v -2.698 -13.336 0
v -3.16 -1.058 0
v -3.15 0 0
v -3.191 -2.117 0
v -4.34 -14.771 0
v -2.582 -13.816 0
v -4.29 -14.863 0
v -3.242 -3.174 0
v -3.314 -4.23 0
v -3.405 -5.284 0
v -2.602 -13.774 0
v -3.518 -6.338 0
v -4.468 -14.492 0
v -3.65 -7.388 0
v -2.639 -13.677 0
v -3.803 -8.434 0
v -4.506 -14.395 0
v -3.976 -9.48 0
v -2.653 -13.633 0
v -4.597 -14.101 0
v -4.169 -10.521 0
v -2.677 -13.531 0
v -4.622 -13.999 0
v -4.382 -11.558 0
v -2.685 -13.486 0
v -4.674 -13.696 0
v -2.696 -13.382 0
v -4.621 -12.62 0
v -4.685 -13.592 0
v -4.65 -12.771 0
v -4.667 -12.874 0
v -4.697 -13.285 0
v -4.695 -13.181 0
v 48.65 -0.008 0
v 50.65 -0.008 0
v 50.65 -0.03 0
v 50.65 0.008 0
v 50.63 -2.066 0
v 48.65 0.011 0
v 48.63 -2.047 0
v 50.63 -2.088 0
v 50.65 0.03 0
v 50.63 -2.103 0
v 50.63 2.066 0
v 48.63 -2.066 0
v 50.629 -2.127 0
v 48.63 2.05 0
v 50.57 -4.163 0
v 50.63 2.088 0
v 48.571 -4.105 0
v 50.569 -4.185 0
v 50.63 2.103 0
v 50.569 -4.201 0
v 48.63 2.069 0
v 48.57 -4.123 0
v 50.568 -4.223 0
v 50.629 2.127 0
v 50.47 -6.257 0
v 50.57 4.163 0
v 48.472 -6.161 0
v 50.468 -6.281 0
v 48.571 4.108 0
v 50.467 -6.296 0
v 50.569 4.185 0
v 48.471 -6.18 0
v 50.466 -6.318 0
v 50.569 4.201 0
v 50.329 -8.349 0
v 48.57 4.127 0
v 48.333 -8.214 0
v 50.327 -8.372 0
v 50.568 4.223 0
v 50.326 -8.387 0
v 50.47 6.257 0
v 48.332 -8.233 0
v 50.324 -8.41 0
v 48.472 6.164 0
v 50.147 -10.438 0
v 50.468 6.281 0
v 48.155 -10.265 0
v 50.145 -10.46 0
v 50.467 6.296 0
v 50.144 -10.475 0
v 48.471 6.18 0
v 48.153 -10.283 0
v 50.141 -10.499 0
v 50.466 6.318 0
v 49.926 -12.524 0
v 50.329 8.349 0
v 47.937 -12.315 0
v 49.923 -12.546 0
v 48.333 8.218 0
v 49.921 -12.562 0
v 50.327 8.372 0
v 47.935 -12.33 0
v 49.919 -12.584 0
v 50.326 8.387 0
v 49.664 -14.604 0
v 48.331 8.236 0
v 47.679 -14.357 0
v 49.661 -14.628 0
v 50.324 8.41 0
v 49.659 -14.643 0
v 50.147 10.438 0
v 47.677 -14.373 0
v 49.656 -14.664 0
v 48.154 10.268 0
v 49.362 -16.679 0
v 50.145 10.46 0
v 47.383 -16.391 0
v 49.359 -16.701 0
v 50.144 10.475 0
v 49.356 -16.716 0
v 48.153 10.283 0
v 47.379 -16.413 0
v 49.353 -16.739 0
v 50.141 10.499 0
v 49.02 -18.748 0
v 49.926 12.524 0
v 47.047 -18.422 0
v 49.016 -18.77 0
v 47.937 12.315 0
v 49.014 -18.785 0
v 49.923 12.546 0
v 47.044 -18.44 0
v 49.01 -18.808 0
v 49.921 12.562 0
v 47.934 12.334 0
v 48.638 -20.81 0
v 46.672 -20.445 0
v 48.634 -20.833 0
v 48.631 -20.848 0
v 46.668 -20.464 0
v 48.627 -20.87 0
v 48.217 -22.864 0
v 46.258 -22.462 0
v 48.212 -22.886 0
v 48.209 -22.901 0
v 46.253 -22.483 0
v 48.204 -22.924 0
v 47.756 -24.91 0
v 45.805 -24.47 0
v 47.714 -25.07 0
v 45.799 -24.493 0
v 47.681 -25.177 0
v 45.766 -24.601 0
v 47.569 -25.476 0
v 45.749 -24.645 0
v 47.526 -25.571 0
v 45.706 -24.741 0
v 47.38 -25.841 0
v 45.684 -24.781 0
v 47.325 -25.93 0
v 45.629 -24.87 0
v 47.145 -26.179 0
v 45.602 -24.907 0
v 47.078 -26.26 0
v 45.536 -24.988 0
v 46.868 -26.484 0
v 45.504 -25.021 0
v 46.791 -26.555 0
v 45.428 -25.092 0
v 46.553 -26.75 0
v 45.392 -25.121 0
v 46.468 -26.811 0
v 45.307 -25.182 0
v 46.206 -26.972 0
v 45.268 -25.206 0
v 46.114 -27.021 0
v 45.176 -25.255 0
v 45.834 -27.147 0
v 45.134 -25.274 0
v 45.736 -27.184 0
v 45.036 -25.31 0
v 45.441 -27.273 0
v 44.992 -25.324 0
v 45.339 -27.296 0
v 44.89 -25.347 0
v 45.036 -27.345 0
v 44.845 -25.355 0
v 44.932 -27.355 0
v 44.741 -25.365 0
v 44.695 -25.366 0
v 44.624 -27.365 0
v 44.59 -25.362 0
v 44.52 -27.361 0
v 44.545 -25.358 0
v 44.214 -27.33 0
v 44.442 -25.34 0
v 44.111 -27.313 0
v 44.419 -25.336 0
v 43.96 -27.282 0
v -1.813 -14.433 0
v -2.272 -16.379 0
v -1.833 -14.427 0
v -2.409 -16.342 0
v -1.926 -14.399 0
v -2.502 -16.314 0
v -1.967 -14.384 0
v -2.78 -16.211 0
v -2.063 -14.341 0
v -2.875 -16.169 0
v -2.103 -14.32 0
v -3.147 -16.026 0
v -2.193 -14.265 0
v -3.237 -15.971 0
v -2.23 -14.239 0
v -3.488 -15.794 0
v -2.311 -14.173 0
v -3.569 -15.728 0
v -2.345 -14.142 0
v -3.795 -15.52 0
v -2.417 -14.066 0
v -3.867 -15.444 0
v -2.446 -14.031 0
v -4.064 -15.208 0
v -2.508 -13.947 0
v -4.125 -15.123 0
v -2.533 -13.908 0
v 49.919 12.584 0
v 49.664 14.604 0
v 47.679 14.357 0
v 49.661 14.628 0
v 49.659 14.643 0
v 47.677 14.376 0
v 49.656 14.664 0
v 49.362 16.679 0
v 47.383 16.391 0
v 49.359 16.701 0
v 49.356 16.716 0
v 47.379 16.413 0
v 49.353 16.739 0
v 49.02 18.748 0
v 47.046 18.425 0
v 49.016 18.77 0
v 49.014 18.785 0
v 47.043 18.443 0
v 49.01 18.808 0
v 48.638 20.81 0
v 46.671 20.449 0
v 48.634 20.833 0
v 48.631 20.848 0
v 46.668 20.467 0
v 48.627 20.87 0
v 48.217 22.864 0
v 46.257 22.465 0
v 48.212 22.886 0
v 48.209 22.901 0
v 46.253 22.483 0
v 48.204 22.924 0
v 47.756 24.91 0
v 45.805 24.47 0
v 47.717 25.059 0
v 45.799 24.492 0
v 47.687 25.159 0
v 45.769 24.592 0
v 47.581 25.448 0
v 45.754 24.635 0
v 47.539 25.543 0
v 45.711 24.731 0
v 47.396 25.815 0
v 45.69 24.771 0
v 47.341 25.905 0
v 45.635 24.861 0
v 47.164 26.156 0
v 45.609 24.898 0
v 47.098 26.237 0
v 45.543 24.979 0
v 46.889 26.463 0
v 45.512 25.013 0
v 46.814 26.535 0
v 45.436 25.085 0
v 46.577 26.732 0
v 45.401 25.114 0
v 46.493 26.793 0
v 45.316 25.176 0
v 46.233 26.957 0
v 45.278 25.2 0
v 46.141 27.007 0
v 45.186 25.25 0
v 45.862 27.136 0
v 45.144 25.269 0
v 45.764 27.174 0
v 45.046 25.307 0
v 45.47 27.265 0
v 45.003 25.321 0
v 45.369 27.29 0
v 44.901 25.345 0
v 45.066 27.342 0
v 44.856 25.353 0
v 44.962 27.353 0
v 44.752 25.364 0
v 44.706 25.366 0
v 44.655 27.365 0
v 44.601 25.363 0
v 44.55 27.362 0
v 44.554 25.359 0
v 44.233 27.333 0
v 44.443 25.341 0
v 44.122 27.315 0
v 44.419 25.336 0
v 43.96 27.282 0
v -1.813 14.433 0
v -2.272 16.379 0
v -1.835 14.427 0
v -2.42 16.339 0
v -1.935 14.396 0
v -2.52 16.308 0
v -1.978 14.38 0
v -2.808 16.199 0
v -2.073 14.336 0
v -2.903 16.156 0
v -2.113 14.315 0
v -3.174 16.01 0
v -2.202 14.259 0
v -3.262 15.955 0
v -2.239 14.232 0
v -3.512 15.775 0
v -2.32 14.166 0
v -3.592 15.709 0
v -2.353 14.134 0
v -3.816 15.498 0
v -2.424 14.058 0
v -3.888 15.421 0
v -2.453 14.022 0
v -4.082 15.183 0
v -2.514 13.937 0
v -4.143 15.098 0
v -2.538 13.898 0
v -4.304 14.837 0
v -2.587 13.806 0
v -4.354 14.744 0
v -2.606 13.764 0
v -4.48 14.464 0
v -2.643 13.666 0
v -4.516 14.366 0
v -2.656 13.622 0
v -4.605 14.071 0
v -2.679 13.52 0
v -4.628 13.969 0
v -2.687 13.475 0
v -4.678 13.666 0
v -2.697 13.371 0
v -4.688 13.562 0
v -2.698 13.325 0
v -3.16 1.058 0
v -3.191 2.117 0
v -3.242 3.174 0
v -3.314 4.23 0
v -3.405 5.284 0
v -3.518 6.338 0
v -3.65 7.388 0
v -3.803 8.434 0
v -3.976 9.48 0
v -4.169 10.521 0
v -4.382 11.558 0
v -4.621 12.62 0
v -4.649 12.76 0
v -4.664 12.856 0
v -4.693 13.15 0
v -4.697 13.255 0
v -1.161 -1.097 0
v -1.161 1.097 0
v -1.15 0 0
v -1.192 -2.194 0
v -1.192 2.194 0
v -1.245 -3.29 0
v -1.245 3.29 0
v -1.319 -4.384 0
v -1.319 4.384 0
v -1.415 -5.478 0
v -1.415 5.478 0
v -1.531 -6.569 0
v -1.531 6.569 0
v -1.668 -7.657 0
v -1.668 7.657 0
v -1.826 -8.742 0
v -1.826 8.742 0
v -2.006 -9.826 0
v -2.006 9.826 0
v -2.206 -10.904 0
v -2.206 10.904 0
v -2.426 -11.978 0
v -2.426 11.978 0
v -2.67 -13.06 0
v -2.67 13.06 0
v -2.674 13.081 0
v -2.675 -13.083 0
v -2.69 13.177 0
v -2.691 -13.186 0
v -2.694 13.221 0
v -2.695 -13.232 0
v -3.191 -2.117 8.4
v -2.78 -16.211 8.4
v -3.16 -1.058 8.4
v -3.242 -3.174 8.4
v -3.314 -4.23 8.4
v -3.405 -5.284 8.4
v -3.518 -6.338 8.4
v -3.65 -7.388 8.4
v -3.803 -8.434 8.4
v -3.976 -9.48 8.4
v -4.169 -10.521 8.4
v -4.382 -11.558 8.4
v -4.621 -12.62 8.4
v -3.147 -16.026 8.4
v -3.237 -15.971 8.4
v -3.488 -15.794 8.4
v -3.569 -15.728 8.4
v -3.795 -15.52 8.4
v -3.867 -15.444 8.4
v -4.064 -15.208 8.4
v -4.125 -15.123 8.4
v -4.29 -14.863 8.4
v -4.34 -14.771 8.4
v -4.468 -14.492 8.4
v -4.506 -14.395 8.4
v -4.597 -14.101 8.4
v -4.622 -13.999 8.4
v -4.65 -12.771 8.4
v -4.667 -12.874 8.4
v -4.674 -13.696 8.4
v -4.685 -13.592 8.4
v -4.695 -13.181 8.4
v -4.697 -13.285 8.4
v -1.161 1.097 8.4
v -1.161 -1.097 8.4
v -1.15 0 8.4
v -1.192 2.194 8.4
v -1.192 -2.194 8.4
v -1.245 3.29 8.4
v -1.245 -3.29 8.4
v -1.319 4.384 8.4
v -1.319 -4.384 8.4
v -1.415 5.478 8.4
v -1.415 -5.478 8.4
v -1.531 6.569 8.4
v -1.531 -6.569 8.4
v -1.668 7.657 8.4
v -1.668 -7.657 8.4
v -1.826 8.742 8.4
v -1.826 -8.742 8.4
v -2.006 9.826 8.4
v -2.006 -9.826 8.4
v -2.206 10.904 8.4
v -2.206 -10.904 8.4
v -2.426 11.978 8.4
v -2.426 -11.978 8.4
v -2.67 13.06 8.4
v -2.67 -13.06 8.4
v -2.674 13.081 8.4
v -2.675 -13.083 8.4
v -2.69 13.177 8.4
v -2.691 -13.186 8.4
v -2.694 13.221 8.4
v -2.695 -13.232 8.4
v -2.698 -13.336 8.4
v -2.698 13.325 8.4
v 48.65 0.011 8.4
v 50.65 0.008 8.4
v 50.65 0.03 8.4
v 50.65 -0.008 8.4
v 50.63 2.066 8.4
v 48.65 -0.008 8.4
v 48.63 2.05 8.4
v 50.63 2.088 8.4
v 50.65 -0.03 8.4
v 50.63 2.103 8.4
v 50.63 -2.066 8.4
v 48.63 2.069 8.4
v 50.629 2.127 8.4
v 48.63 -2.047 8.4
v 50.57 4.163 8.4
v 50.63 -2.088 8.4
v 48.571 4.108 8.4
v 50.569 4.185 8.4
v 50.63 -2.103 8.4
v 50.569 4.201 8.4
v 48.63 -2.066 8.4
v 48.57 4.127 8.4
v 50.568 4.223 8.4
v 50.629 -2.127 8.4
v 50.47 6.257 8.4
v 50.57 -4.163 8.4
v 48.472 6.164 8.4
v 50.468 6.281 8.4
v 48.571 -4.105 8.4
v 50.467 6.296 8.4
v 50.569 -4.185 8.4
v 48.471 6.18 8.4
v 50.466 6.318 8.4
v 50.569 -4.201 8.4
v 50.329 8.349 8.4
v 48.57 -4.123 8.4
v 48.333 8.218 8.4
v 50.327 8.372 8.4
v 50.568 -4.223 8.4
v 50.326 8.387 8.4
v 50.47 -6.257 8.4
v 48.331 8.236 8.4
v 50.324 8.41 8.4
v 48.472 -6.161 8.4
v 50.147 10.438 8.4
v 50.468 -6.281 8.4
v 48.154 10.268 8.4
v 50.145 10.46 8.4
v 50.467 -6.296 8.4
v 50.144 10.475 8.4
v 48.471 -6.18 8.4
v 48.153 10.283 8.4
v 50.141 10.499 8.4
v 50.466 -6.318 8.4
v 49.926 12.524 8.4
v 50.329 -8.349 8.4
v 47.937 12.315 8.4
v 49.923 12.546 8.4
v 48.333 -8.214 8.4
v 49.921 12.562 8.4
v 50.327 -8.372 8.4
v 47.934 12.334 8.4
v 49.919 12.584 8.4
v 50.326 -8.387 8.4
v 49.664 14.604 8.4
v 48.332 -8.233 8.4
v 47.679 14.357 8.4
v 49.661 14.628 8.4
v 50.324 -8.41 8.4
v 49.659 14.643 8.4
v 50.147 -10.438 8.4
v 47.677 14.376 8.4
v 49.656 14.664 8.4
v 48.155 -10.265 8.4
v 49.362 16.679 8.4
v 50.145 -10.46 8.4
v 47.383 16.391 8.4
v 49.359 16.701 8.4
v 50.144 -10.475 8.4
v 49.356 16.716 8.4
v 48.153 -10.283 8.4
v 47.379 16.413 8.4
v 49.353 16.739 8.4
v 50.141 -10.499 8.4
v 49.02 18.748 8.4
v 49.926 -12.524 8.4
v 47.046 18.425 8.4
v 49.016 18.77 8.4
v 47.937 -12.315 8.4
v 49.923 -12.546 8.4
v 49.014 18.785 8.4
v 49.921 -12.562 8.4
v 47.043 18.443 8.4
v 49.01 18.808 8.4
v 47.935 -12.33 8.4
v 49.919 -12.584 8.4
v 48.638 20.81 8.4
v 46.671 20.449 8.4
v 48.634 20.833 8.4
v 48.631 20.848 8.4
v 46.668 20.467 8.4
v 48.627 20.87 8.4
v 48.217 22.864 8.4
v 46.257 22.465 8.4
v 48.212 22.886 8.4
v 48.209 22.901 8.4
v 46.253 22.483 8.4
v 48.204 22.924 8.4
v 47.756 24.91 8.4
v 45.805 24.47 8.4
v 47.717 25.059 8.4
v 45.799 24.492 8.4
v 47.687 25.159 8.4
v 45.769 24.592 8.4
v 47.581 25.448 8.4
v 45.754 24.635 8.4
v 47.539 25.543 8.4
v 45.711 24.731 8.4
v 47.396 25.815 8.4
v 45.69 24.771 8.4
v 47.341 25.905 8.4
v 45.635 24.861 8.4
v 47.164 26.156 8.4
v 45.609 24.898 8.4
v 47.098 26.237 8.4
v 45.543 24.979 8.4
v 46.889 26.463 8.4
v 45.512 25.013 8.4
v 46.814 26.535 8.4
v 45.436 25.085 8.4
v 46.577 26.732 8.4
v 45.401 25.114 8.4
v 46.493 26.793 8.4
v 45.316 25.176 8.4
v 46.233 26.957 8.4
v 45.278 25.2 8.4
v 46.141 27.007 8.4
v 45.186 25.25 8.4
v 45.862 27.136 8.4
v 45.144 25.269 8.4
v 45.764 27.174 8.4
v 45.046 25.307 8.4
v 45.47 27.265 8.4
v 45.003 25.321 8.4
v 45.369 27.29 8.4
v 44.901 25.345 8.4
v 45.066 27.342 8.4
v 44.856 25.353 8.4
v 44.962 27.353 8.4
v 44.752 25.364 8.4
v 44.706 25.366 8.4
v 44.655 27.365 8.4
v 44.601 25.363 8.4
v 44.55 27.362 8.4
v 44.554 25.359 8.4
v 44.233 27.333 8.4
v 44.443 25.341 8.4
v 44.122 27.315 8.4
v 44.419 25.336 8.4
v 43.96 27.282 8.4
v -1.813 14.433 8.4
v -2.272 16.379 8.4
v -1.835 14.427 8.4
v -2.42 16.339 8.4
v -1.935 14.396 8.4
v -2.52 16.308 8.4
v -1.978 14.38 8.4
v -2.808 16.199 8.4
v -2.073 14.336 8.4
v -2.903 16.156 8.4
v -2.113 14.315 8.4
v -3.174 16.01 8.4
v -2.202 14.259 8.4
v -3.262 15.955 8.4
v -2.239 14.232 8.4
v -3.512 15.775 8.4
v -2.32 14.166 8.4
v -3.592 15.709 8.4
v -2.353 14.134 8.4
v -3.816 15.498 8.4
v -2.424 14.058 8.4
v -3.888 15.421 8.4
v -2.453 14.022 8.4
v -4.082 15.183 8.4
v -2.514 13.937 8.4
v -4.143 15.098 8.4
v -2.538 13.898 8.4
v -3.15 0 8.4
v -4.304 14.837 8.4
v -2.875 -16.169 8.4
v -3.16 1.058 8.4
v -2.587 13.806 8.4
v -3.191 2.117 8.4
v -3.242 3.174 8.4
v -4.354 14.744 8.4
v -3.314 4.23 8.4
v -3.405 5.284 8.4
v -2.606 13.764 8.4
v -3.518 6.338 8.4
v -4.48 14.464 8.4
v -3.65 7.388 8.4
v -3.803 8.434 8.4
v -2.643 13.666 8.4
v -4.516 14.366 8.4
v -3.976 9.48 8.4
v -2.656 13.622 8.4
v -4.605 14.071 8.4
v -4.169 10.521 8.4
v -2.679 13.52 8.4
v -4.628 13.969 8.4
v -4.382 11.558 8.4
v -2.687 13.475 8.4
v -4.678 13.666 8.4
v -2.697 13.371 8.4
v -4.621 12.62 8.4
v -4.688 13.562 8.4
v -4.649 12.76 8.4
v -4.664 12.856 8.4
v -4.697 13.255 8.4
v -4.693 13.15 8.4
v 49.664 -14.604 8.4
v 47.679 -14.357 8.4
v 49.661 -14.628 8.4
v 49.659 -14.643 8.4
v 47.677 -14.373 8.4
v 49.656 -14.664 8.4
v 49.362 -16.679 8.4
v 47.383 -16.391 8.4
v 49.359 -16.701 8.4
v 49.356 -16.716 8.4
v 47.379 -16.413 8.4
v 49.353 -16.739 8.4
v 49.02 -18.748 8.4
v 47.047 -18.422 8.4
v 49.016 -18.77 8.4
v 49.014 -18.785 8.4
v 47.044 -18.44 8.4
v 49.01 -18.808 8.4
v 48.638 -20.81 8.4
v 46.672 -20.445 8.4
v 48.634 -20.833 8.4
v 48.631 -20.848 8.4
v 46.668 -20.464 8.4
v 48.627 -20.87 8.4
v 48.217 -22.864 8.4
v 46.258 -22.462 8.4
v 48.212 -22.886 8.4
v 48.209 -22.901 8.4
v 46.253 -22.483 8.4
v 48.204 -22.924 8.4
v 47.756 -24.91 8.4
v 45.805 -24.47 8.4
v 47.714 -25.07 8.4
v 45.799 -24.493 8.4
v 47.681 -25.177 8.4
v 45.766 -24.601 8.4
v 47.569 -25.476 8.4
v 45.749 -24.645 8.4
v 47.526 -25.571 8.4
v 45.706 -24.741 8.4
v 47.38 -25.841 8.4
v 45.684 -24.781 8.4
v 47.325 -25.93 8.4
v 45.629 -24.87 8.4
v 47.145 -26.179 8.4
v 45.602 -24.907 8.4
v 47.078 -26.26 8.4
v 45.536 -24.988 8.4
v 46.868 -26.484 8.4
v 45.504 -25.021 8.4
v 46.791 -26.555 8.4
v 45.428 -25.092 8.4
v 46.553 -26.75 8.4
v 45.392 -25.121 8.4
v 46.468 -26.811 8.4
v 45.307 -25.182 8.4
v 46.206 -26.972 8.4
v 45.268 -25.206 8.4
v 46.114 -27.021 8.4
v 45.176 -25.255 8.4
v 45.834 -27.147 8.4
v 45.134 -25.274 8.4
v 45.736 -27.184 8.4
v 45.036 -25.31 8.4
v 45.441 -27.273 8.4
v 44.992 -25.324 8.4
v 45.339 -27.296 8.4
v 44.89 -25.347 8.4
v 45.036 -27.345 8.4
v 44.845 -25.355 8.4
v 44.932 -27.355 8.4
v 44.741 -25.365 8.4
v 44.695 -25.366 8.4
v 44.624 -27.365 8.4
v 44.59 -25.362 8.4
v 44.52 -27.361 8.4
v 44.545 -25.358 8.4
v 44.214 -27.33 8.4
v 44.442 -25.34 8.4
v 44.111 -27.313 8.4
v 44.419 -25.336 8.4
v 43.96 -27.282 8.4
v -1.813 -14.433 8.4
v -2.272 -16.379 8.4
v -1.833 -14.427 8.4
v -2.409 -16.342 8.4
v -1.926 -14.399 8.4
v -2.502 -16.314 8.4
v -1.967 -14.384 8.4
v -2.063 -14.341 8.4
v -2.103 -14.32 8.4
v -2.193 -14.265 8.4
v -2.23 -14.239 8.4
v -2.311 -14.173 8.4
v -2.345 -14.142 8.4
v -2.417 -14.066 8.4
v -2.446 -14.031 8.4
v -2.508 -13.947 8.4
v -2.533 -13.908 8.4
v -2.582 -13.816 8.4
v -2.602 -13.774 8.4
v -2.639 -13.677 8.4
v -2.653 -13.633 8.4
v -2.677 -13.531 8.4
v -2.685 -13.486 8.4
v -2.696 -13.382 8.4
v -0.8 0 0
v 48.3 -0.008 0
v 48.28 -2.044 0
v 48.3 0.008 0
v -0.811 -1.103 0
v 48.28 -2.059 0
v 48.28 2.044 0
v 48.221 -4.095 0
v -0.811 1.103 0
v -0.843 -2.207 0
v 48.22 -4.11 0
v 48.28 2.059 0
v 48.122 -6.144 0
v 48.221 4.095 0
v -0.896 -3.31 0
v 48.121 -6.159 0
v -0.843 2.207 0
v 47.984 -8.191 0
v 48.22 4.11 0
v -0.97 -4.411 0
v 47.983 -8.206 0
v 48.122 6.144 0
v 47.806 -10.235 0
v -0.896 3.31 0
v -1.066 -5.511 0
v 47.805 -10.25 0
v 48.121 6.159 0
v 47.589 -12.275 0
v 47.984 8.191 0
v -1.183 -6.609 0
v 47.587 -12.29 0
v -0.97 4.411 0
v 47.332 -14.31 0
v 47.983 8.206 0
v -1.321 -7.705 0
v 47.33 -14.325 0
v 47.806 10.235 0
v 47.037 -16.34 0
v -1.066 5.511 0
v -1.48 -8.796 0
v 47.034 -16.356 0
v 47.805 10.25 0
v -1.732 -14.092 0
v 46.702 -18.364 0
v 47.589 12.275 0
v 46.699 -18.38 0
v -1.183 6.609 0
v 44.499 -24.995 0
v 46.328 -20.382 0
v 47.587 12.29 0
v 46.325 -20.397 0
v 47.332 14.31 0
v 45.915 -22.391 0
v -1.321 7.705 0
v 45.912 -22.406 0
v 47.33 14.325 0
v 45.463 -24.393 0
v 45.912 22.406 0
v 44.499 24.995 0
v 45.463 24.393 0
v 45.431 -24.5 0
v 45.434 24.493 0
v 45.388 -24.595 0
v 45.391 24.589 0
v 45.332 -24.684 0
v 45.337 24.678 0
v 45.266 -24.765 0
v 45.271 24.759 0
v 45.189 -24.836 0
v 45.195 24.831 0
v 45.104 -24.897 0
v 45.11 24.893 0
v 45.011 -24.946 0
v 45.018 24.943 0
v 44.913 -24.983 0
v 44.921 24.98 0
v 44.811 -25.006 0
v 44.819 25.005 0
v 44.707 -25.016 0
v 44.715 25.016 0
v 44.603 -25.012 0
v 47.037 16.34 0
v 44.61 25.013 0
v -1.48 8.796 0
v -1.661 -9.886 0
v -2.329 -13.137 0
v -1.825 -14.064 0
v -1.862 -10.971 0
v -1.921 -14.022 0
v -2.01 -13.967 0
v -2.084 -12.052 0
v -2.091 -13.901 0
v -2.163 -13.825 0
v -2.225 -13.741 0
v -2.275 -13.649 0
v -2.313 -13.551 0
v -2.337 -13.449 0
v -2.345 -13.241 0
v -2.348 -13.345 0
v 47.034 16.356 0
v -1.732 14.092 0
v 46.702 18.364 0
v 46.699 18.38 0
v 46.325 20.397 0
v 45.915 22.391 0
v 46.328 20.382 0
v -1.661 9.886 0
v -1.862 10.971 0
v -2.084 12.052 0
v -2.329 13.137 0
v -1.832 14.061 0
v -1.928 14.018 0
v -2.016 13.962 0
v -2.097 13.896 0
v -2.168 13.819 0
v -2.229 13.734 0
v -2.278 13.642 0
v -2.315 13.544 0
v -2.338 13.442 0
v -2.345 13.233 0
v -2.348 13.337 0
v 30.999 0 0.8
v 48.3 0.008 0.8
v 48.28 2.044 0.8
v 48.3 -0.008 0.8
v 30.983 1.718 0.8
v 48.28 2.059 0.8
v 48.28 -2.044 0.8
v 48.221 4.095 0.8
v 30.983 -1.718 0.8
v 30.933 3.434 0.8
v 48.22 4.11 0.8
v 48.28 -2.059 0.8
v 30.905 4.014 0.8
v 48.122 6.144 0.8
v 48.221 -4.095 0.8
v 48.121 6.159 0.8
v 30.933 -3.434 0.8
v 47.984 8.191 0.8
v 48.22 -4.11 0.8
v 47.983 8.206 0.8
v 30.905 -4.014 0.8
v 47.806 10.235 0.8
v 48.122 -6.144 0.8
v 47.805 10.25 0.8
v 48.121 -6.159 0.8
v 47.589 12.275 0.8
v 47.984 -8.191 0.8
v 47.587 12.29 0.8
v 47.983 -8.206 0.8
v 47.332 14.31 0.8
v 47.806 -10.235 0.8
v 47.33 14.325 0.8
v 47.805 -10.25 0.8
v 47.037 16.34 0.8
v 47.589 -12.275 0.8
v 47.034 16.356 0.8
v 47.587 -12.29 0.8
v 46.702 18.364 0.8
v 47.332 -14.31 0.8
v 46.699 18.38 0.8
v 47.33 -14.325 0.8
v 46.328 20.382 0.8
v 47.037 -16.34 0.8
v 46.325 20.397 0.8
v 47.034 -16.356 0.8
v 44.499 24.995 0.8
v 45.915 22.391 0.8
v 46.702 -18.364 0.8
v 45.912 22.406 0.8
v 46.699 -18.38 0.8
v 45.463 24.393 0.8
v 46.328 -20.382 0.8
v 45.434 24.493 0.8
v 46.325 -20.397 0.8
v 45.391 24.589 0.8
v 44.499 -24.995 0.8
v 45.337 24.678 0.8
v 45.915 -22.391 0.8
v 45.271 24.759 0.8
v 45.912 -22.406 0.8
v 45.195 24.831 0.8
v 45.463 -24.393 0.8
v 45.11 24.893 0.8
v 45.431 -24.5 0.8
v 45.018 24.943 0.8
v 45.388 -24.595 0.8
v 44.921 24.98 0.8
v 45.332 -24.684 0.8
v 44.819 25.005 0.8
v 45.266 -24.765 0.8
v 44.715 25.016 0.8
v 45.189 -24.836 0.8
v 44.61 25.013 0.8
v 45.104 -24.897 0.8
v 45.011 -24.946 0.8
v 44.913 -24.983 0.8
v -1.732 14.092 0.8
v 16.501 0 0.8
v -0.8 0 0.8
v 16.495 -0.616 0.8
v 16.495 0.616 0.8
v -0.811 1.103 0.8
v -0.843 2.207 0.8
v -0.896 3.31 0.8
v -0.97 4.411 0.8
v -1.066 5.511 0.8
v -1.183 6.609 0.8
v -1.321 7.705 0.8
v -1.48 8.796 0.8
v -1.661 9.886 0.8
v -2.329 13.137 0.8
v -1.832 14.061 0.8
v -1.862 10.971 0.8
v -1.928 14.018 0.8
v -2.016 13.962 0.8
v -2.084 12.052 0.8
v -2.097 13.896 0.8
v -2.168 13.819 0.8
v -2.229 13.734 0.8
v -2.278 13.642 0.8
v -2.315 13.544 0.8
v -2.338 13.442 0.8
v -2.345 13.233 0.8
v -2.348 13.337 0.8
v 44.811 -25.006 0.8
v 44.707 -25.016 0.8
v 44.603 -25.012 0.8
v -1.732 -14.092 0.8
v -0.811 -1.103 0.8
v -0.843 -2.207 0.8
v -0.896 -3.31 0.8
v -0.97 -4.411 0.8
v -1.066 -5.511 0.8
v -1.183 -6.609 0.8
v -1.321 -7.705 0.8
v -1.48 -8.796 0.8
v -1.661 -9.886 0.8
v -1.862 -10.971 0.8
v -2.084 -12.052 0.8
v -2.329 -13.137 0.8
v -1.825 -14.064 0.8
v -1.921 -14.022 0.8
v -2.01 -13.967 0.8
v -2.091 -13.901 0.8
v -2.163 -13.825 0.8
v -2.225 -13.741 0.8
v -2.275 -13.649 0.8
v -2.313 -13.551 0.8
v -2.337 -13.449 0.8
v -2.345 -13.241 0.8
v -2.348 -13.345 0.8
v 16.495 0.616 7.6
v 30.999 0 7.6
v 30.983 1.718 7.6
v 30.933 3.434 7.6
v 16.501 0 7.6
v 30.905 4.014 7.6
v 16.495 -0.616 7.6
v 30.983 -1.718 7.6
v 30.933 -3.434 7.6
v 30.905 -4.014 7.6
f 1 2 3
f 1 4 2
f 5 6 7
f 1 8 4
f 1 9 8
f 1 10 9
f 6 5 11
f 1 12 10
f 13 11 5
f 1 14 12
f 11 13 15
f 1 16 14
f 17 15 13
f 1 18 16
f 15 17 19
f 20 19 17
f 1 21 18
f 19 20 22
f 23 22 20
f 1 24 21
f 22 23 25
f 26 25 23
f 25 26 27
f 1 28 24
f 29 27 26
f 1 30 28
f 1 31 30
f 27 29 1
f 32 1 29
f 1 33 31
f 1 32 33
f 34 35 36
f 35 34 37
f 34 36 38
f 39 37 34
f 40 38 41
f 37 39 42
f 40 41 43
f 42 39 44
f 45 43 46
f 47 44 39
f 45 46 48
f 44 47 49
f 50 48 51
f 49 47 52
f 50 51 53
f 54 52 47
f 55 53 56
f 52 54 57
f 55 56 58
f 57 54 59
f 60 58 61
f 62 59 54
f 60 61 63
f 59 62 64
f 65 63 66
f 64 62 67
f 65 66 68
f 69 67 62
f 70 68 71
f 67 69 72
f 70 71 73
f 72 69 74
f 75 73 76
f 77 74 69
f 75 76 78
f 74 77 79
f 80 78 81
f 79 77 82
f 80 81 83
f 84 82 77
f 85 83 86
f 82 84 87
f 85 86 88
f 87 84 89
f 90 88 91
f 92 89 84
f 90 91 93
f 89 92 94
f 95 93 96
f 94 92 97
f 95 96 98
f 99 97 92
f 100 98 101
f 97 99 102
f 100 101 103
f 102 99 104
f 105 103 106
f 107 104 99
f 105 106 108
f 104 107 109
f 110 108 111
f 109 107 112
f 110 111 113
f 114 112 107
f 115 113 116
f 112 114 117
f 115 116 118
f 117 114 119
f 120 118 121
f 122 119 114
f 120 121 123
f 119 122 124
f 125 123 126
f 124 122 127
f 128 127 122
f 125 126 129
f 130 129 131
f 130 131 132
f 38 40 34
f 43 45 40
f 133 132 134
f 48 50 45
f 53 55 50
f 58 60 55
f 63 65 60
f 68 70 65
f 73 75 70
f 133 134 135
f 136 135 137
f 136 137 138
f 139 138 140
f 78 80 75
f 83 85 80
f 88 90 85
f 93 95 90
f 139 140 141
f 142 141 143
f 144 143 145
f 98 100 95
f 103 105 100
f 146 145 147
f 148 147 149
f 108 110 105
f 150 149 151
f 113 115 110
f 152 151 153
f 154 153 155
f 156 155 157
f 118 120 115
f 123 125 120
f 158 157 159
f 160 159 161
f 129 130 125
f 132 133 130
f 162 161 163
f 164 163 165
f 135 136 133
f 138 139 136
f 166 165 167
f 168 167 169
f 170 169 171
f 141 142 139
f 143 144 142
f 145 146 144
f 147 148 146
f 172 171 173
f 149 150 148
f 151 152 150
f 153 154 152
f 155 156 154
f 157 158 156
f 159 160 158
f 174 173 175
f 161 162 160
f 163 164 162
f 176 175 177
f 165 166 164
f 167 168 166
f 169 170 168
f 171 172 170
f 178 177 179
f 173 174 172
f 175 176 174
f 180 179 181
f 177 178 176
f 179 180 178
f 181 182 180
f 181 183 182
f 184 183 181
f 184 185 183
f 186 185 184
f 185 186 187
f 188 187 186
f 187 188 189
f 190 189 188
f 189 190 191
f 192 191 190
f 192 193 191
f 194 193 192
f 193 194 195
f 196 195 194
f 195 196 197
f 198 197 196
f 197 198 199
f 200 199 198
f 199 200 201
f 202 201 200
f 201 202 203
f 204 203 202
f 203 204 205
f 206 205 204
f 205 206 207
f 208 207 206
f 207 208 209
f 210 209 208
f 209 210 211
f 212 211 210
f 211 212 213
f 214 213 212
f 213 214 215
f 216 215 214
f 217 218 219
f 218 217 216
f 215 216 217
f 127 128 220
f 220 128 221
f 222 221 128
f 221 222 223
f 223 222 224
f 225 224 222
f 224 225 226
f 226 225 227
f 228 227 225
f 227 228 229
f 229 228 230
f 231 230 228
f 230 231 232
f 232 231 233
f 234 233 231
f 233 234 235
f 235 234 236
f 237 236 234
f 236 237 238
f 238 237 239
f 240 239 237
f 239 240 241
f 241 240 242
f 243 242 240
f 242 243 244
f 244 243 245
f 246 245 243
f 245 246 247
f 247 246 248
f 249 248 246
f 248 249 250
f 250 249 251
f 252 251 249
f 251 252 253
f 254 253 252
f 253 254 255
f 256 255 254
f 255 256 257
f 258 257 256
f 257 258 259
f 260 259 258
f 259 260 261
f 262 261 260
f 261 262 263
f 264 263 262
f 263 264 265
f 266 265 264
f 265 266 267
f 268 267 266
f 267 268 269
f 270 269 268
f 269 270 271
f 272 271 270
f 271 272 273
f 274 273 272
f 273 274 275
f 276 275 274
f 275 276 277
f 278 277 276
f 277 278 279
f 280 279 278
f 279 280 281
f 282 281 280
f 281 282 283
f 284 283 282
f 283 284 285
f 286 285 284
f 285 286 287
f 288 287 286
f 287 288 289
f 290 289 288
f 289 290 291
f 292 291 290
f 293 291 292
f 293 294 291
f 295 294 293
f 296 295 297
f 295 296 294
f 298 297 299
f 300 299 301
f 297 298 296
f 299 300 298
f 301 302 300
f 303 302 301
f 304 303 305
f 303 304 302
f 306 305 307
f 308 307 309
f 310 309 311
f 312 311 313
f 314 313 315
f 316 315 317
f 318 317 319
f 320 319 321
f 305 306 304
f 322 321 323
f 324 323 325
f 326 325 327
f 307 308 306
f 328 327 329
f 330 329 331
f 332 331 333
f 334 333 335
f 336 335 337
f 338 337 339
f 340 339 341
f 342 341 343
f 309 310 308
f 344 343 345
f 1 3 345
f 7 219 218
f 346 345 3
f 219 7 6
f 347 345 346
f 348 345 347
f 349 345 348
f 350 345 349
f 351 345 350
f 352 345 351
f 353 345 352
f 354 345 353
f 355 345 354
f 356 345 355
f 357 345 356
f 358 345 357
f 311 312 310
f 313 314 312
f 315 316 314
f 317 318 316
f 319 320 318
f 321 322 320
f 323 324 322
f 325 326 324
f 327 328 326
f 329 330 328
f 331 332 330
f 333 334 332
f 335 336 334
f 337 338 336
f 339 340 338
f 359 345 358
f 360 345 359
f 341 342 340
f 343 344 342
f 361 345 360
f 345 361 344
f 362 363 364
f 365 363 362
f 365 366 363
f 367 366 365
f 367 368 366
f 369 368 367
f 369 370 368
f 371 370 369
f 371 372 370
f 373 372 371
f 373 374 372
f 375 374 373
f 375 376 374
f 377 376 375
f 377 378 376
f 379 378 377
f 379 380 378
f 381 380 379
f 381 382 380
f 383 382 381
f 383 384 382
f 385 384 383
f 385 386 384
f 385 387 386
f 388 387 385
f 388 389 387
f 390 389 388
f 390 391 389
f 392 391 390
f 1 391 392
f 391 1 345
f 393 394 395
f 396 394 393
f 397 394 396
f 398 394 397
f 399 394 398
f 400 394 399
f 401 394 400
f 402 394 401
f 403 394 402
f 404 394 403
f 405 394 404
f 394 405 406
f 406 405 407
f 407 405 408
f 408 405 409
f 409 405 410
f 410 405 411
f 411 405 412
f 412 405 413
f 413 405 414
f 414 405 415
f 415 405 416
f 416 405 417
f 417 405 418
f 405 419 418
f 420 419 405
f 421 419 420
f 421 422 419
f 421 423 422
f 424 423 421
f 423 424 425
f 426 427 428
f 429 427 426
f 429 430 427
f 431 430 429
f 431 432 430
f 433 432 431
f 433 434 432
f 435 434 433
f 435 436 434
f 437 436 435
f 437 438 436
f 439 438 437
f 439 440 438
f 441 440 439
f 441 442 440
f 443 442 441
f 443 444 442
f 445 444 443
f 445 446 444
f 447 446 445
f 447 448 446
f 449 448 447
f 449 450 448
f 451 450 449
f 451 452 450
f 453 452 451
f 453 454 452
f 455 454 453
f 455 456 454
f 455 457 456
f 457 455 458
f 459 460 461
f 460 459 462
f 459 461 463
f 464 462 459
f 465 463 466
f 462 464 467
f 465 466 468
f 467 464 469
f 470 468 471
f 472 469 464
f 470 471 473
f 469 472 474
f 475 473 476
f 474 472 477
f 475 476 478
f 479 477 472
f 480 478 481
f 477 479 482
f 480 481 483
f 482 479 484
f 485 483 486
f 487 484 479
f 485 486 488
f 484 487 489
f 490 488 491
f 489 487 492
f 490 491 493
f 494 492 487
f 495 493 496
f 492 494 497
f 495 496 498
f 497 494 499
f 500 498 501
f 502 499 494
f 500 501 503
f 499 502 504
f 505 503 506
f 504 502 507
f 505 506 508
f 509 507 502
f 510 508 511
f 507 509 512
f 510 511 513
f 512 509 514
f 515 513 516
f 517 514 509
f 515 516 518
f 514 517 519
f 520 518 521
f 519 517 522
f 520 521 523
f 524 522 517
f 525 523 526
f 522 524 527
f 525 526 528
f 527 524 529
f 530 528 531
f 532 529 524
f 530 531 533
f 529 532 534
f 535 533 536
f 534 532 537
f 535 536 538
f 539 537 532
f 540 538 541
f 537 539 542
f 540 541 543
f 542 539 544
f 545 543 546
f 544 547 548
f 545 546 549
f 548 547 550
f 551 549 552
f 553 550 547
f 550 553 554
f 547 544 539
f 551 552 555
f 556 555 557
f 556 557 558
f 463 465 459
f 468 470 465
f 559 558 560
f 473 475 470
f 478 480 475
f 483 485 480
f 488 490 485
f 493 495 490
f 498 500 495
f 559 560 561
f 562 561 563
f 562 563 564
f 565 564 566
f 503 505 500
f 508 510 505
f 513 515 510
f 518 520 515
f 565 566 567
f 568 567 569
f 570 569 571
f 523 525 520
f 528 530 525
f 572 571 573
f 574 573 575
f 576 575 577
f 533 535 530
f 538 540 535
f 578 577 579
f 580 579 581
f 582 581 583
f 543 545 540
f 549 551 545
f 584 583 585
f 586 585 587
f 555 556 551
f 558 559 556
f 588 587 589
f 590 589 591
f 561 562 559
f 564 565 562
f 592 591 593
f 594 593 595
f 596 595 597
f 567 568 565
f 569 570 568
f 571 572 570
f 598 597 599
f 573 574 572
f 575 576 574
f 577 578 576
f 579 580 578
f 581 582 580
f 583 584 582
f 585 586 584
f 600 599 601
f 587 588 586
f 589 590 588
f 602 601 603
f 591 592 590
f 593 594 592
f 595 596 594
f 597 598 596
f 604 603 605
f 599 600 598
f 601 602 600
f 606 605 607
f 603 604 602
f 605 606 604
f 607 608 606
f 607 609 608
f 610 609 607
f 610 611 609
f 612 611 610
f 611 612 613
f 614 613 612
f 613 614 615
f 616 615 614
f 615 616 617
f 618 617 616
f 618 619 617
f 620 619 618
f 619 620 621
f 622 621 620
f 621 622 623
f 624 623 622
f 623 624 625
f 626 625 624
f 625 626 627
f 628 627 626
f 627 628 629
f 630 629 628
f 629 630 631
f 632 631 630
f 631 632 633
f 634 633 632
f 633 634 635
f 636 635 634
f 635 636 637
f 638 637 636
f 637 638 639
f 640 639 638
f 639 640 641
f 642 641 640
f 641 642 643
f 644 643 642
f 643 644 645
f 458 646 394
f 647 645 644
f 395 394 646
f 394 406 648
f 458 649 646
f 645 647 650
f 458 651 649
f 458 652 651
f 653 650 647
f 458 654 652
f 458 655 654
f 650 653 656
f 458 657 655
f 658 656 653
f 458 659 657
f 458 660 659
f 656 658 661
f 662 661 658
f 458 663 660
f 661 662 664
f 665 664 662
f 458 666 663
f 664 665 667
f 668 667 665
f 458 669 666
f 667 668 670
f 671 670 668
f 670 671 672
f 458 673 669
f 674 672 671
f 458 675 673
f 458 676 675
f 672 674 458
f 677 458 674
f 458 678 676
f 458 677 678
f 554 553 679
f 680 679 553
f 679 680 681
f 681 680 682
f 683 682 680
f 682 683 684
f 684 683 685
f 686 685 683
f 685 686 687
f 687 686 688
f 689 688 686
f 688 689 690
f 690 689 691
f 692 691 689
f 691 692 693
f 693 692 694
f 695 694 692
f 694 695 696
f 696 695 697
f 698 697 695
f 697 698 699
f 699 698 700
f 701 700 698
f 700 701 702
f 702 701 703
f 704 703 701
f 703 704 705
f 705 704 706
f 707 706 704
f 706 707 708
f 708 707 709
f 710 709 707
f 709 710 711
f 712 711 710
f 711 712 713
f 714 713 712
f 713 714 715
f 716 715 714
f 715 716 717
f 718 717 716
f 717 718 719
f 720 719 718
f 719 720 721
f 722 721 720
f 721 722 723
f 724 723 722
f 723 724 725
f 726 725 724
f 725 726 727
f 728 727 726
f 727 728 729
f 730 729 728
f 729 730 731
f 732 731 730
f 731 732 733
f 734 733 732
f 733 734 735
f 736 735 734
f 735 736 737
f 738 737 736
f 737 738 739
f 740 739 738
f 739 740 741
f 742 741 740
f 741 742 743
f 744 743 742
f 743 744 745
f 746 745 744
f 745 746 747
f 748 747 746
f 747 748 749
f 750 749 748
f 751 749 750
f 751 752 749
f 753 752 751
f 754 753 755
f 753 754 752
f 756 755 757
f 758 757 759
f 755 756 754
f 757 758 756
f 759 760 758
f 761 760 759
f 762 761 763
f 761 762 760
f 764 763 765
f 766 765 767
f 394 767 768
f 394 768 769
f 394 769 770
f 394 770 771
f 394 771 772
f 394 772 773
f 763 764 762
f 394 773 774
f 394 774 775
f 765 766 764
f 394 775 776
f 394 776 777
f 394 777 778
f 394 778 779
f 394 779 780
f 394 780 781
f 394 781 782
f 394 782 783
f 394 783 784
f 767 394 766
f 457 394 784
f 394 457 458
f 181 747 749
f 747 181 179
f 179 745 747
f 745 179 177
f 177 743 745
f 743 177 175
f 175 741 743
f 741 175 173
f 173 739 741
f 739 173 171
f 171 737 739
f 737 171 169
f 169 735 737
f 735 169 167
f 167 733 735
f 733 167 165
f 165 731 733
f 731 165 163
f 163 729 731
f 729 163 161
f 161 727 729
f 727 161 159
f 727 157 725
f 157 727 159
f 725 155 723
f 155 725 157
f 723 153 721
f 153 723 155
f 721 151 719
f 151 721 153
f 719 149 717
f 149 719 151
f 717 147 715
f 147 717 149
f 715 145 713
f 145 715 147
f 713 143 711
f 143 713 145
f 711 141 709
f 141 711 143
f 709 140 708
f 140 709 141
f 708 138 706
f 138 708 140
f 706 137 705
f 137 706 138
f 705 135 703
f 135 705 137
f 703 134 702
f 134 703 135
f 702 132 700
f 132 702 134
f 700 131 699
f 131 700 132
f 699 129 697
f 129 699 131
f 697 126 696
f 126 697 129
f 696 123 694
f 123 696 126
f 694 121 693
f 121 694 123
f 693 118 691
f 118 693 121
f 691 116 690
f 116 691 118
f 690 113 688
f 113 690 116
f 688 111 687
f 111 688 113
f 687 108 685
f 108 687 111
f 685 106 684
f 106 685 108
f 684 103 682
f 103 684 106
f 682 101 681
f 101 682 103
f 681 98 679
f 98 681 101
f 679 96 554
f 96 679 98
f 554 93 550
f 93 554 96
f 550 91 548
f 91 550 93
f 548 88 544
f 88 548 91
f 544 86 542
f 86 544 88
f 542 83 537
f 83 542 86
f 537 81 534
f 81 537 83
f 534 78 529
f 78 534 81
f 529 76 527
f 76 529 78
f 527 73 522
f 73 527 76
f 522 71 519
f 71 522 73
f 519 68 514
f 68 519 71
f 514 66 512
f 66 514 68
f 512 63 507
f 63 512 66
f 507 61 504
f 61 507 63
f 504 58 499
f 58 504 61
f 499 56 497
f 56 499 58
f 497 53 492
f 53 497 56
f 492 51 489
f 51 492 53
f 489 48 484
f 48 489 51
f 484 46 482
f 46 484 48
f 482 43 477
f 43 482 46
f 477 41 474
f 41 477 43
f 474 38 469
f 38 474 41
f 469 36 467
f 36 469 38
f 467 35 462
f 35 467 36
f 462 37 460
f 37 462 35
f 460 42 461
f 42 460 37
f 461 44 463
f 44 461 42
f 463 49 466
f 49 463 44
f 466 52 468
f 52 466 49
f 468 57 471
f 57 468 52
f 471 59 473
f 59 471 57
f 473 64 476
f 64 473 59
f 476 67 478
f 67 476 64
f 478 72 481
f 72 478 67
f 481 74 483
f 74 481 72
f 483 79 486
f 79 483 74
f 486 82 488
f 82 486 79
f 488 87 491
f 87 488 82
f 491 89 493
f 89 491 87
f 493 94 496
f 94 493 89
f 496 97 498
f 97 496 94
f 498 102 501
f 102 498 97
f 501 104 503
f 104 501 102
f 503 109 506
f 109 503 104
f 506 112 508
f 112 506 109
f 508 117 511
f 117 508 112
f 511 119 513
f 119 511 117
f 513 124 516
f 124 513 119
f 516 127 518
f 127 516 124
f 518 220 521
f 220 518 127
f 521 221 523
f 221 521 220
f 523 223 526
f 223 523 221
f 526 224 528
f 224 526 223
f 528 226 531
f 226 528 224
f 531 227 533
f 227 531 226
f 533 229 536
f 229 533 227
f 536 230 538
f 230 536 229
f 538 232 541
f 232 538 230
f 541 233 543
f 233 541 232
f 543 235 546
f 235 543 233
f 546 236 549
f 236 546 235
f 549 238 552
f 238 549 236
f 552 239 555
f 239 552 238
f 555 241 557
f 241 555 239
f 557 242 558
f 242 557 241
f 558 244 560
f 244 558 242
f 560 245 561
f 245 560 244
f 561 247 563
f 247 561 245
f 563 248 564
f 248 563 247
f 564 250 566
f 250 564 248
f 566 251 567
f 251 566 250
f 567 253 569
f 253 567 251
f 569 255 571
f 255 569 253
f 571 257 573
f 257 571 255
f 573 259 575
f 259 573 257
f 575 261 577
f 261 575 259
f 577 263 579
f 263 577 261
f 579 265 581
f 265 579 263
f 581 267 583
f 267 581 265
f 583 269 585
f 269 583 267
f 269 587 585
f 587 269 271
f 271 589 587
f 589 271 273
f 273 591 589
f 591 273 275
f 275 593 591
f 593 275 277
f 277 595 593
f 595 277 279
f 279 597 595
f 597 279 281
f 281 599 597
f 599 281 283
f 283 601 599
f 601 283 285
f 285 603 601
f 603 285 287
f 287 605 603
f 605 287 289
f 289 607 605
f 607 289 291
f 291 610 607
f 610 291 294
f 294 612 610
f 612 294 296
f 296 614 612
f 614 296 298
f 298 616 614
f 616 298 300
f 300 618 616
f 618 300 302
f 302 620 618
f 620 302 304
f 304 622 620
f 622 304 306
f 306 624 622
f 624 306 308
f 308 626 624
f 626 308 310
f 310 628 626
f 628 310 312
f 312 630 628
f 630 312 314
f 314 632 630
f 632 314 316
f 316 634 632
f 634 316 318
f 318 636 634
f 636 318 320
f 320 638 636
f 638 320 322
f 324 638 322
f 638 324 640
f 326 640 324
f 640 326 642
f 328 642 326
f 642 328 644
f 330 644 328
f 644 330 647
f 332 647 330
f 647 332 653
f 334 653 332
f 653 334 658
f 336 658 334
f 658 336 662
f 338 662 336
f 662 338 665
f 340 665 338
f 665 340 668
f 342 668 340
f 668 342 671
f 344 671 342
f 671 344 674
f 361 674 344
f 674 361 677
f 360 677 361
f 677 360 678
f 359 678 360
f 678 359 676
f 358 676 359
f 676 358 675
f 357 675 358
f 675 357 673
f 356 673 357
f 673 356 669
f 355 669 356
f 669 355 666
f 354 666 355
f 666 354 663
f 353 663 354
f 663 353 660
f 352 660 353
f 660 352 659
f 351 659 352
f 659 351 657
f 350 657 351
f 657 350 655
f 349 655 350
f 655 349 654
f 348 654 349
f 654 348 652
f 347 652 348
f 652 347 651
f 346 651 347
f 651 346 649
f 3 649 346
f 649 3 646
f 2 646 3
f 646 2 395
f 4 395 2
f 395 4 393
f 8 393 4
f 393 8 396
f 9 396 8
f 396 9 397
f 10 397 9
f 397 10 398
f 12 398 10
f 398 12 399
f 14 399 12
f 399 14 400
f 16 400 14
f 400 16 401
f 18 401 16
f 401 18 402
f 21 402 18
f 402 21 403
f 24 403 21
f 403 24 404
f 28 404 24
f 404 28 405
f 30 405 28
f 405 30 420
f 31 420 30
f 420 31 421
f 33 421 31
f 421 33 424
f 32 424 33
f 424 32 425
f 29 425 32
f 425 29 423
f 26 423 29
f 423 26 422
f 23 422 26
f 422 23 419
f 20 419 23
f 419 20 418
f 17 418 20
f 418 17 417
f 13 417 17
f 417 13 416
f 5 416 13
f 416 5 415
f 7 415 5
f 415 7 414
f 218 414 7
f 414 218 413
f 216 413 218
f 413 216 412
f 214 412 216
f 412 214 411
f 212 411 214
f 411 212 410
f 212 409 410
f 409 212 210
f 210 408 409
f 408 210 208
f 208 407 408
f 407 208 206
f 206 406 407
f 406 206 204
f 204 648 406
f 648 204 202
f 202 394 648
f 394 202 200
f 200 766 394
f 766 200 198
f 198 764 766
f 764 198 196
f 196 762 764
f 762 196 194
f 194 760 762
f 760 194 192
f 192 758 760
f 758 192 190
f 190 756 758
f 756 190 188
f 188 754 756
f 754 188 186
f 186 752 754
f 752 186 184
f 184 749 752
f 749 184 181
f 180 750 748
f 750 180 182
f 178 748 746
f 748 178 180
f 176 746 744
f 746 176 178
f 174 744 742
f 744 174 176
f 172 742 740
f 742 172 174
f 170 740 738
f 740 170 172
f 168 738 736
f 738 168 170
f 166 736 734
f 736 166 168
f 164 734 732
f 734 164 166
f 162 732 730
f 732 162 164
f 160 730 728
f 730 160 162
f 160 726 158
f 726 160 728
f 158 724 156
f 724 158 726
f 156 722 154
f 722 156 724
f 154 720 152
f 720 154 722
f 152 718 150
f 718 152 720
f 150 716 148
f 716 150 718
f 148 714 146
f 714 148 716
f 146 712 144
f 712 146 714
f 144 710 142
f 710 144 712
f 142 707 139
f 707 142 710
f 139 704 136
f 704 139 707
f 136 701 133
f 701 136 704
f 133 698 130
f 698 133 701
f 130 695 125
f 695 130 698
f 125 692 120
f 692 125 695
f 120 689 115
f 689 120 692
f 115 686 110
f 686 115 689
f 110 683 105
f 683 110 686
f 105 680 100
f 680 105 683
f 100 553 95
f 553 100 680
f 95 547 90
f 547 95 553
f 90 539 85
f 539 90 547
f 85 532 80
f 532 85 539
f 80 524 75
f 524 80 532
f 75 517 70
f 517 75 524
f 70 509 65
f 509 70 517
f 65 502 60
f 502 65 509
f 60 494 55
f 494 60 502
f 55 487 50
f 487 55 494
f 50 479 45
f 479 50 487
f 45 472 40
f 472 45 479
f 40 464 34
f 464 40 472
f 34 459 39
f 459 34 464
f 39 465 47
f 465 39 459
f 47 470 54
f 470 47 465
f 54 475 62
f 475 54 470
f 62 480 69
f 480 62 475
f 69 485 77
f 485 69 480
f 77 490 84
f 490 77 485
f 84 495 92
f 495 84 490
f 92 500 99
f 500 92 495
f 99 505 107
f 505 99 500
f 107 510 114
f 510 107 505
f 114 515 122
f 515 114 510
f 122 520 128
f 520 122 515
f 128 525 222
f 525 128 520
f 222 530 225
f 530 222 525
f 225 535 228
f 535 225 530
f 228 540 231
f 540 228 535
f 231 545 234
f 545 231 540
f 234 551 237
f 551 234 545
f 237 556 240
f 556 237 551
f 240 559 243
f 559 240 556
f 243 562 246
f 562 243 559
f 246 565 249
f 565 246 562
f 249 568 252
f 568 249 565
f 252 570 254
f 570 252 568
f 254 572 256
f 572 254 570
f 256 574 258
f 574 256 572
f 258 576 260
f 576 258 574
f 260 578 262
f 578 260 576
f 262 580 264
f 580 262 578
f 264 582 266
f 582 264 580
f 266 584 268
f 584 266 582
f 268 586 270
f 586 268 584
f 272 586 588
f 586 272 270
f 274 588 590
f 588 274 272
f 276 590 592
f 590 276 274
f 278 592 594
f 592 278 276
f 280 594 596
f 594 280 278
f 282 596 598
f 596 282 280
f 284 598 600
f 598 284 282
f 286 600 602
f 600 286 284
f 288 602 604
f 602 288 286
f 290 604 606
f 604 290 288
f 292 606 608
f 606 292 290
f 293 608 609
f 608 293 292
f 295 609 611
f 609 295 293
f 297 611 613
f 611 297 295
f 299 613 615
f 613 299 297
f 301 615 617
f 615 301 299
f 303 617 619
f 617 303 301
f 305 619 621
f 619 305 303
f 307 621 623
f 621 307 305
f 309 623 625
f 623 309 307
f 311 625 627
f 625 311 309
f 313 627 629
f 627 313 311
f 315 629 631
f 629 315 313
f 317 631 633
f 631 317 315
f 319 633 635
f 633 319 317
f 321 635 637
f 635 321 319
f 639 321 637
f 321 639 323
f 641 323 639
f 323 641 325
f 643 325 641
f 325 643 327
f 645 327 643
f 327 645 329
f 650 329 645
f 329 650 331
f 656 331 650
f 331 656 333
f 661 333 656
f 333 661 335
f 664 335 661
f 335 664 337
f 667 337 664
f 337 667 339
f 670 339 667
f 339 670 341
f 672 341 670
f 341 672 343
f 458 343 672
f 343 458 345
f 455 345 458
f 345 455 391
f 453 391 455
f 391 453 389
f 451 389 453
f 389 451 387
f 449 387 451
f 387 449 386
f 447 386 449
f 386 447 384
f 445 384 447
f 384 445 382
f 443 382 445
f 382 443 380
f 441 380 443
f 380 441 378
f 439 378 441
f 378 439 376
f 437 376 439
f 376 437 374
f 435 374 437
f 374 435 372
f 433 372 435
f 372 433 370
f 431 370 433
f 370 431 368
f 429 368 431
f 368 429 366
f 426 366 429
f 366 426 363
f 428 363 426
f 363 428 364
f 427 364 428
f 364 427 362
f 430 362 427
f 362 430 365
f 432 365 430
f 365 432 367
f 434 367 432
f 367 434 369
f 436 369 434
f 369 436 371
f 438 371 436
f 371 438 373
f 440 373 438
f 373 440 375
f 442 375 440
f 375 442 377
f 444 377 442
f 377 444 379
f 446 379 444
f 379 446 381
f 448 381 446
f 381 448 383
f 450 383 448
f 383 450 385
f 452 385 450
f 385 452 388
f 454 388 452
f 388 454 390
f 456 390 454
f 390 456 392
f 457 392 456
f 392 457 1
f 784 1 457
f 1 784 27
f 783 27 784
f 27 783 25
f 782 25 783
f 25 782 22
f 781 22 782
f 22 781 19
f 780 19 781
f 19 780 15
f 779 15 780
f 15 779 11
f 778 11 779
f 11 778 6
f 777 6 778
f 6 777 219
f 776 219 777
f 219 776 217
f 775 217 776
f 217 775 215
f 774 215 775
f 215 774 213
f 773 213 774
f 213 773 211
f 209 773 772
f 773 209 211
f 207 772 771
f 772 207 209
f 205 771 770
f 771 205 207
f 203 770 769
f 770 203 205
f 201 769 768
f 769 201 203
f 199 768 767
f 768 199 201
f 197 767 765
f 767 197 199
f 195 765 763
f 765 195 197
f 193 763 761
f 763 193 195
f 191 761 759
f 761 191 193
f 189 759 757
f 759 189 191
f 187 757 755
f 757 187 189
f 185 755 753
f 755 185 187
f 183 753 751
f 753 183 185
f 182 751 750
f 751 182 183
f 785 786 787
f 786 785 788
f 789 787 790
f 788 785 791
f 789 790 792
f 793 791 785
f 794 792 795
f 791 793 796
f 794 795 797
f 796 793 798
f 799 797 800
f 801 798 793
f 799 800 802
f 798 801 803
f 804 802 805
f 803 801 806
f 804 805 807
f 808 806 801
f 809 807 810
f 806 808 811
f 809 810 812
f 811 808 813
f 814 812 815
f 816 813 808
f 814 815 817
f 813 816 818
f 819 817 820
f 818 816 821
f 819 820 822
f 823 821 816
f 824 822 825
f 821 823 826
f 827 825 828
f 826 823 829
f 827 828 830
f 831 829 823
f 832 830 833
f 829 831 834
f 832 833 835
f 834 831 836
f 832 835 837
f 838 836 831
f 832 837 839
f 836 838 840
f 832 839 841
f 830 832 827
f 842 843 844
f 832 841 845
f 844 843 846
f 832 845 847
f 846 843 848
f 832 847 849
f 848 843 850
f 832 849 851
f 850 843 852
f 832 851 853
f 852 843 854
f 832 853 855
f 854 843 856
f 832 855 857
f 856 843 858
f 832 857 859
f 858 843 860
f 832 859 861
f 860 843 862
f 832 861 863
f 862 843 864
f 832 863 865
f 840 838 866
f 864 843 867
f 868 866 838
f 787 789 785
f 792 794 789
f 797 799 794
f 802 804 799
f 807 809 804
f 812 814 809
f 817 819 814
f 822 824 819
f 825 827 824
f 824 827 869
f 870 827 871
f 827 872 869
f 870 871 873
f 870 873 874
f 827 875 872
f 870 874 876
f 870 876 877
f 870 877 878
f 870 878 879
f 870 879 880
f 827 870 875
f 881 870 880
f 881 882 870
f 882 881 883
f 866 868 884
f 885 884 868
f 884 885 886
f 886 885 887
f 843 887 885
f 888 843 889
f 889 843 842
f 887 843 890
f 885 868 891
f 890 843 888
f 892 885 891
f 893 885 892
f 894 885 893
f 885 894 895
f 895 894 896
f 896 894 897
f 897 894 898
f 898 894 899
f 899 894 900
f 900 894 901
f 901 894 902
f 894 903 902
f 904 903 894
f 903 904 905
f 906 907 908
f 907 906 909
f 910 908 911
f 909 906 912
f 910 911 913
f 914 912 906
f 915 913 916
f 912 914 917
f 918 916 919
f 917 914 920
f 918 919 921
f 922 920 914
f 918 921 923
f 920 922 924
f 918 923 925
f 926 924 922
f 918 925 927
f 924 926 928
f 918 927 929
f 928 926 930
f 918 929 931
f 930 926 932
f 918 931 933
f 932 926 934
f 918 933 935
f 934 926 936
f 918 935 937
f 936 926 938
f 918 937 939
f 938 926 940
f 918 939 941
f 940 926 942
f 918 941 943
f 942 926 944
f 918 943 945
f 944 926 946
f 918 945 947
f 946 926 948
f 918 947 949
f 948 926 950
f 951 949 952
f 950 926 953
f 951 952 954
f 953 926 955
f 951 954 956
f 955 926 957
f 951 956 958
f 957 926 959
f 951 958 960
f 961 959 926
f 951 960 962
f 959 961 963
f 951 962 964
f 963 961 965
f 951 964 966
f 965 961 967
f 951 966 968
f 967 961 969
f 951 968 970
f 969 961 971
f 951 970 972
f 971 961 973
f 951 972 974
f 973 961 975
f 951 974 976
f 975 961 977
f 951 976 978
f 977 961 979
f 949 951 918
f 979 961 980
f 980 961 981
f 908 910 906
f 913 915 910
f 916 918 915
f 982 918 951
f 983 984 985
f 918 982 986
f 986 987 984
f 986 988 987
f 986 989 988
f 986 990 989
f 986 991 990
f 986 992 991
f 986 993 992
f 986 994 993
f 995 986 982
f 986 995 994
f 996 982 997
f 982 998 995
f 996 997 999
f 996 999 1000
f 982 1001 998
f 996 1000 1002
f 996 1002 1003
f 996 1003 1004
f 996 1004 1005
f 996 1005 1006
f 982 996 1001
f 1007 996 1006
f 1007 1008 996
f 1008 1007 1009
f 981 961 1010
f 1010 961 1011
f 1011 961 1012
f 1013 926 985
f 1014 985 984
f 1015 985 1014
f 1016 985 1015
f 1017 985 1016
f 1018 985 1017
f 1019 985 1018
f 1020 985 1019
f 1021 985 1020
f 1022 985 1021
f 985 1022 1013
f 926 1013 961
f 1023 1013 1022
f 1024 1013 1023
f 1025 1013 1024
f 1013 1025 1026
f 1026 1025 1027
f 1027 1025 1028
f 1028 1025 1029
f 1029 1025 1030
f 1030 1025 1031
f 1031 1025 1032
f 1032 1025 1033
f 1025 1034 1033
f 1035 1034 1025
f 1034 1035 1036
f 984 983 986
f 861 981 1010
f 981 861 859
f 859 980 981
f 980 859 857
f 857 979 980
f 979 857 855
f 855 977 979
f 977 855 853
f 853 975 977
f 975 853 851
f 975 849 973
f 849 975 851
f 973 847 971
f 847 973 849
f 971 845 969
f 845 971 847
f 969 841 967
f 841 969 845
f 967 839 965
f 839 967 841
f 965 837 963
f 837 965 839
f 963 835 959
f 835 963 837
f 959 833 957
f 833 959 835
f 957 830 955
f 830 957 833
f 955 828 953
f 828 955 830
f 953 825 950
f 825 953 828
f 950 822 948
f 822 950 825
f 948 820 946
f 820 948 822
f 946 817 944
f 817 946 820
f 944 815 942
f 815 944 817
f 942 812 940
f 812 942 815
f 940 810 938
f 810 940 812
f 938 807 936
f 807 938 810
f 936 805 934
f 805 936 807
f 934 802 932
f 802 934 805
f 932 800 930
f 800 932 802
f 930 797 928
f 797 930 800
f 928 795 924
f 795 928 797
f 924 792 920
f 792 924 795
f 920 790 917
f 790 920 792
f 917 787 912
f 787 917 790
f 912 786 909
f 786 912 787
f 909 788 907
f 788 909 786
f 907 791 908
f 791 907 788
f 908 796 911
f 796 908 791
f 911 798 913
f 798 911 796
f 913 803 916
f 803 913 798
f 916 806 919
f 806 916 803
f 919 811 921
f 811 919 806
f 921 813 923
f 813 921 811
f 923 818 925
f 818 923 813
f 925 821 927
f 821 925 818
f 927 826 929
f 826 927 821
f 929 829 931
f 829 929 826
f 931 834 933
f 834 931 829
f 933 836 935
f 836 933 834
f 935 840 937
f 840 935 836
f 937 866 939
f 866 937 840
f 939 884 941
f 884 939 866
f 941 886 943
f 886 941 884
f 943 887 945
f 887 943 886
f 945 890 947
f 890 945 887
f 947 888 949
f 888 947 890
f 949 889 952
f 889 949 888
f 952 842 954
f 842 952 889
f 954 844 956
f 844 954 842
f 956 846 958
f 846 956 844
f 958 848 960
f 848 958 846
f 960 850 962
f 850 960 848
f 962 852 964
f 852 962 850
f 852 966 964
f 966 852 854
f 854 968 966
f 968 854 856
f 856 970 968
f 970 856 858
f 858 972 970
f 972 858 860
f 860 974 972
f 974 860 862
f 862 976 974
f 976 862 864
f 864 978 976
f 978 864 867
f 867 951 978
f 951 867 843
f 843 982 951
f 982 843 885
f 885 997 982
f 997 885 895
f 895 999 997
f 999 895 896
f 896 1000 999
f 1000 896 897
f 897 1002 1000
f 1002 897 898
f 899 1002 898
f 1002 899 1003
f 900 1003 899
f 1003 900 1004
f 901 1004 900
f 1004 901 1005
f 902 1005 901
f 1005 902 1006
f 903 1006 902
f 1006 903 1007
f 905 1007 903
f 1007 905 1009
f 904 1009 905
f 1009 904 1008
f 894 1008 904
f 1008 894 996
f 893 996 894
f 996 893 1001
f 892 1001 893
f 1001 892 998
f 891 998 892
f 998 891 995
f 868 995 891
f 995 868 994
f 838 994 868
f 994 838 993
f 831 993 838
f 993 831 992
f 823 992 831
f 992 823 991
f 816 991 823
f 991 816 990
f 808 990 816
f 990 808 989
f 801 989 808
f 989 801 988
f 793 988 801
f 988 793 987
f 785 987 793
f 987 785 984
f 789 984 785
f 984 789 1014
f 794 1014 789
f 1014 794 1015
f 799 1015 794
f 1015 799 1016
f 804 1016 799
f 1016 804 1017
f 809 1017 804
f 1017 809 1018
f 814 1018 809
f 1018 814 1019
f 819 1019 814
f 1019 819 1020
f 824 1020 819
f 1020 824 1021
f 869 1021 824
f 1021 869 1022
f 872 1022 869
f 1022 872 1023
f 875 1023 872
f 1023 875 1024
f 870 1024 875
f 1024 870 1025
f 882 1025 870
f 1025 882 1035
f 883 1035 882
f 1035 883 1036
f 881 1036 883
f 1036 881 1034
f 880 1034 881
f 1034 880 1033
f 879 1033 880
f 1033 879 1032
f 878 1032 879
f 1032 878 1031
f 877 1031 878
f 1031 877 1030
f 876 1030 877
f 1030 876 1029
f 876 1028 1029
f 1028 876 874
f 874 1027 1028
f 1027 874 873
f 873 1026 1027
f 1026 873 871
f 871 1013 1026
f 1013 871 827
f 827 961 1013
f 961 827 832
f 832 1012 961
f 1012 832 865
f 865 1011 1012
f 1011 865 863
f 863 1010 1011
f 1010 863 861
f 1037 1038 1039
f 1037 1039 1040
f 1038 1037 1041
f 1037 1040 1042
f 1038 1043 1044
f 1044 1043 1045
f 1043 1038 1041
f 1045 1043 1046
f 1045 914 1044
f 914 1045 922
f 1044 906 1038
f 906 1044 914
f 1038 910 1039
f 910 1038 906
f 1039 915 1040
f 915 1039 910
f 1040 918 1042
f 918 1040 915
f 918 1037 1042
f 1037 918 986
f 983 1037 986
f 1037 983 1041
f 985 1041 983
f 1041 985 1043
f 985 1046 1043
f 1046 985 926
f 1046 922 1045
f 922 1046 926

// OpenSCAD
// Gen-CY — fit coupon (bay part): O20/O5 THROUGH pockets at carrier thickness (test on a steel offcut), 608 seat,
// D-flat bore, gap shim, and one bobbin-bay slice (bobbin footprint + bay_clear) to test former fit.
include <parameters.scad>;
$fn = 48;
// D-flat keyed bore: flat faces +X (angle 0 = magnet pocket 0 = index notch)
module dflat_bore(h) {
    intersection() {
        cylinder(d=shaft_bore, h=h);
        translate([-shaft_bore, -shaft_bore, 0]) cube([shaft_bore + dflat_x, 2*shaft_bore, h]);
    }
}
module sector_2d(r_in, r_out, ang) {
    polygon([
        for (a = [-ang/2 : ang/24 : ang/2]) [r_in*cos(a), r_in*sin(a)],
        for (a = [ang/2 : -ang/24 : -ang/2]) [r_out*cos(a), r_out*sin(a)]
    ]);
}
module footprint_2d() { offset(r=wall) sector_2d(coil_id_r, coil_od_r, span_deg); }
module hub_2d()       { offset(delta=-coil_core_inset) sector_2d(coil_id_r, coil_od_r, span_deg); }

// bay slice at FULL stator thickness with one bobbin BASE printed IN PLACE inside it (bay_clear gap): this is the
// print-in-place test for the one-plate stator. After printing, the base must pop out with finger pressure; if it is fused,
// print coil_former.stl separately (print-packs/parts/) instead of using the in-place bases.
translate([-coil_id_r, 0, 0]) {
    difference() {
        linear_extrude(stator_thick) offset(r=bay_clear + 2) footprint_2d();
        translate([0, 0, -0.1]) linear_extrude(stator_thick + 0.2) offset(r=bay_clear) footprint_2d();
    }
    union() {
        linear_extrude(flange_t) footprint_2d();
        translate([0, 0, flange_t - 0.01]) linear_extrude(former_web + 0.01) hub_2d();
    }
}
